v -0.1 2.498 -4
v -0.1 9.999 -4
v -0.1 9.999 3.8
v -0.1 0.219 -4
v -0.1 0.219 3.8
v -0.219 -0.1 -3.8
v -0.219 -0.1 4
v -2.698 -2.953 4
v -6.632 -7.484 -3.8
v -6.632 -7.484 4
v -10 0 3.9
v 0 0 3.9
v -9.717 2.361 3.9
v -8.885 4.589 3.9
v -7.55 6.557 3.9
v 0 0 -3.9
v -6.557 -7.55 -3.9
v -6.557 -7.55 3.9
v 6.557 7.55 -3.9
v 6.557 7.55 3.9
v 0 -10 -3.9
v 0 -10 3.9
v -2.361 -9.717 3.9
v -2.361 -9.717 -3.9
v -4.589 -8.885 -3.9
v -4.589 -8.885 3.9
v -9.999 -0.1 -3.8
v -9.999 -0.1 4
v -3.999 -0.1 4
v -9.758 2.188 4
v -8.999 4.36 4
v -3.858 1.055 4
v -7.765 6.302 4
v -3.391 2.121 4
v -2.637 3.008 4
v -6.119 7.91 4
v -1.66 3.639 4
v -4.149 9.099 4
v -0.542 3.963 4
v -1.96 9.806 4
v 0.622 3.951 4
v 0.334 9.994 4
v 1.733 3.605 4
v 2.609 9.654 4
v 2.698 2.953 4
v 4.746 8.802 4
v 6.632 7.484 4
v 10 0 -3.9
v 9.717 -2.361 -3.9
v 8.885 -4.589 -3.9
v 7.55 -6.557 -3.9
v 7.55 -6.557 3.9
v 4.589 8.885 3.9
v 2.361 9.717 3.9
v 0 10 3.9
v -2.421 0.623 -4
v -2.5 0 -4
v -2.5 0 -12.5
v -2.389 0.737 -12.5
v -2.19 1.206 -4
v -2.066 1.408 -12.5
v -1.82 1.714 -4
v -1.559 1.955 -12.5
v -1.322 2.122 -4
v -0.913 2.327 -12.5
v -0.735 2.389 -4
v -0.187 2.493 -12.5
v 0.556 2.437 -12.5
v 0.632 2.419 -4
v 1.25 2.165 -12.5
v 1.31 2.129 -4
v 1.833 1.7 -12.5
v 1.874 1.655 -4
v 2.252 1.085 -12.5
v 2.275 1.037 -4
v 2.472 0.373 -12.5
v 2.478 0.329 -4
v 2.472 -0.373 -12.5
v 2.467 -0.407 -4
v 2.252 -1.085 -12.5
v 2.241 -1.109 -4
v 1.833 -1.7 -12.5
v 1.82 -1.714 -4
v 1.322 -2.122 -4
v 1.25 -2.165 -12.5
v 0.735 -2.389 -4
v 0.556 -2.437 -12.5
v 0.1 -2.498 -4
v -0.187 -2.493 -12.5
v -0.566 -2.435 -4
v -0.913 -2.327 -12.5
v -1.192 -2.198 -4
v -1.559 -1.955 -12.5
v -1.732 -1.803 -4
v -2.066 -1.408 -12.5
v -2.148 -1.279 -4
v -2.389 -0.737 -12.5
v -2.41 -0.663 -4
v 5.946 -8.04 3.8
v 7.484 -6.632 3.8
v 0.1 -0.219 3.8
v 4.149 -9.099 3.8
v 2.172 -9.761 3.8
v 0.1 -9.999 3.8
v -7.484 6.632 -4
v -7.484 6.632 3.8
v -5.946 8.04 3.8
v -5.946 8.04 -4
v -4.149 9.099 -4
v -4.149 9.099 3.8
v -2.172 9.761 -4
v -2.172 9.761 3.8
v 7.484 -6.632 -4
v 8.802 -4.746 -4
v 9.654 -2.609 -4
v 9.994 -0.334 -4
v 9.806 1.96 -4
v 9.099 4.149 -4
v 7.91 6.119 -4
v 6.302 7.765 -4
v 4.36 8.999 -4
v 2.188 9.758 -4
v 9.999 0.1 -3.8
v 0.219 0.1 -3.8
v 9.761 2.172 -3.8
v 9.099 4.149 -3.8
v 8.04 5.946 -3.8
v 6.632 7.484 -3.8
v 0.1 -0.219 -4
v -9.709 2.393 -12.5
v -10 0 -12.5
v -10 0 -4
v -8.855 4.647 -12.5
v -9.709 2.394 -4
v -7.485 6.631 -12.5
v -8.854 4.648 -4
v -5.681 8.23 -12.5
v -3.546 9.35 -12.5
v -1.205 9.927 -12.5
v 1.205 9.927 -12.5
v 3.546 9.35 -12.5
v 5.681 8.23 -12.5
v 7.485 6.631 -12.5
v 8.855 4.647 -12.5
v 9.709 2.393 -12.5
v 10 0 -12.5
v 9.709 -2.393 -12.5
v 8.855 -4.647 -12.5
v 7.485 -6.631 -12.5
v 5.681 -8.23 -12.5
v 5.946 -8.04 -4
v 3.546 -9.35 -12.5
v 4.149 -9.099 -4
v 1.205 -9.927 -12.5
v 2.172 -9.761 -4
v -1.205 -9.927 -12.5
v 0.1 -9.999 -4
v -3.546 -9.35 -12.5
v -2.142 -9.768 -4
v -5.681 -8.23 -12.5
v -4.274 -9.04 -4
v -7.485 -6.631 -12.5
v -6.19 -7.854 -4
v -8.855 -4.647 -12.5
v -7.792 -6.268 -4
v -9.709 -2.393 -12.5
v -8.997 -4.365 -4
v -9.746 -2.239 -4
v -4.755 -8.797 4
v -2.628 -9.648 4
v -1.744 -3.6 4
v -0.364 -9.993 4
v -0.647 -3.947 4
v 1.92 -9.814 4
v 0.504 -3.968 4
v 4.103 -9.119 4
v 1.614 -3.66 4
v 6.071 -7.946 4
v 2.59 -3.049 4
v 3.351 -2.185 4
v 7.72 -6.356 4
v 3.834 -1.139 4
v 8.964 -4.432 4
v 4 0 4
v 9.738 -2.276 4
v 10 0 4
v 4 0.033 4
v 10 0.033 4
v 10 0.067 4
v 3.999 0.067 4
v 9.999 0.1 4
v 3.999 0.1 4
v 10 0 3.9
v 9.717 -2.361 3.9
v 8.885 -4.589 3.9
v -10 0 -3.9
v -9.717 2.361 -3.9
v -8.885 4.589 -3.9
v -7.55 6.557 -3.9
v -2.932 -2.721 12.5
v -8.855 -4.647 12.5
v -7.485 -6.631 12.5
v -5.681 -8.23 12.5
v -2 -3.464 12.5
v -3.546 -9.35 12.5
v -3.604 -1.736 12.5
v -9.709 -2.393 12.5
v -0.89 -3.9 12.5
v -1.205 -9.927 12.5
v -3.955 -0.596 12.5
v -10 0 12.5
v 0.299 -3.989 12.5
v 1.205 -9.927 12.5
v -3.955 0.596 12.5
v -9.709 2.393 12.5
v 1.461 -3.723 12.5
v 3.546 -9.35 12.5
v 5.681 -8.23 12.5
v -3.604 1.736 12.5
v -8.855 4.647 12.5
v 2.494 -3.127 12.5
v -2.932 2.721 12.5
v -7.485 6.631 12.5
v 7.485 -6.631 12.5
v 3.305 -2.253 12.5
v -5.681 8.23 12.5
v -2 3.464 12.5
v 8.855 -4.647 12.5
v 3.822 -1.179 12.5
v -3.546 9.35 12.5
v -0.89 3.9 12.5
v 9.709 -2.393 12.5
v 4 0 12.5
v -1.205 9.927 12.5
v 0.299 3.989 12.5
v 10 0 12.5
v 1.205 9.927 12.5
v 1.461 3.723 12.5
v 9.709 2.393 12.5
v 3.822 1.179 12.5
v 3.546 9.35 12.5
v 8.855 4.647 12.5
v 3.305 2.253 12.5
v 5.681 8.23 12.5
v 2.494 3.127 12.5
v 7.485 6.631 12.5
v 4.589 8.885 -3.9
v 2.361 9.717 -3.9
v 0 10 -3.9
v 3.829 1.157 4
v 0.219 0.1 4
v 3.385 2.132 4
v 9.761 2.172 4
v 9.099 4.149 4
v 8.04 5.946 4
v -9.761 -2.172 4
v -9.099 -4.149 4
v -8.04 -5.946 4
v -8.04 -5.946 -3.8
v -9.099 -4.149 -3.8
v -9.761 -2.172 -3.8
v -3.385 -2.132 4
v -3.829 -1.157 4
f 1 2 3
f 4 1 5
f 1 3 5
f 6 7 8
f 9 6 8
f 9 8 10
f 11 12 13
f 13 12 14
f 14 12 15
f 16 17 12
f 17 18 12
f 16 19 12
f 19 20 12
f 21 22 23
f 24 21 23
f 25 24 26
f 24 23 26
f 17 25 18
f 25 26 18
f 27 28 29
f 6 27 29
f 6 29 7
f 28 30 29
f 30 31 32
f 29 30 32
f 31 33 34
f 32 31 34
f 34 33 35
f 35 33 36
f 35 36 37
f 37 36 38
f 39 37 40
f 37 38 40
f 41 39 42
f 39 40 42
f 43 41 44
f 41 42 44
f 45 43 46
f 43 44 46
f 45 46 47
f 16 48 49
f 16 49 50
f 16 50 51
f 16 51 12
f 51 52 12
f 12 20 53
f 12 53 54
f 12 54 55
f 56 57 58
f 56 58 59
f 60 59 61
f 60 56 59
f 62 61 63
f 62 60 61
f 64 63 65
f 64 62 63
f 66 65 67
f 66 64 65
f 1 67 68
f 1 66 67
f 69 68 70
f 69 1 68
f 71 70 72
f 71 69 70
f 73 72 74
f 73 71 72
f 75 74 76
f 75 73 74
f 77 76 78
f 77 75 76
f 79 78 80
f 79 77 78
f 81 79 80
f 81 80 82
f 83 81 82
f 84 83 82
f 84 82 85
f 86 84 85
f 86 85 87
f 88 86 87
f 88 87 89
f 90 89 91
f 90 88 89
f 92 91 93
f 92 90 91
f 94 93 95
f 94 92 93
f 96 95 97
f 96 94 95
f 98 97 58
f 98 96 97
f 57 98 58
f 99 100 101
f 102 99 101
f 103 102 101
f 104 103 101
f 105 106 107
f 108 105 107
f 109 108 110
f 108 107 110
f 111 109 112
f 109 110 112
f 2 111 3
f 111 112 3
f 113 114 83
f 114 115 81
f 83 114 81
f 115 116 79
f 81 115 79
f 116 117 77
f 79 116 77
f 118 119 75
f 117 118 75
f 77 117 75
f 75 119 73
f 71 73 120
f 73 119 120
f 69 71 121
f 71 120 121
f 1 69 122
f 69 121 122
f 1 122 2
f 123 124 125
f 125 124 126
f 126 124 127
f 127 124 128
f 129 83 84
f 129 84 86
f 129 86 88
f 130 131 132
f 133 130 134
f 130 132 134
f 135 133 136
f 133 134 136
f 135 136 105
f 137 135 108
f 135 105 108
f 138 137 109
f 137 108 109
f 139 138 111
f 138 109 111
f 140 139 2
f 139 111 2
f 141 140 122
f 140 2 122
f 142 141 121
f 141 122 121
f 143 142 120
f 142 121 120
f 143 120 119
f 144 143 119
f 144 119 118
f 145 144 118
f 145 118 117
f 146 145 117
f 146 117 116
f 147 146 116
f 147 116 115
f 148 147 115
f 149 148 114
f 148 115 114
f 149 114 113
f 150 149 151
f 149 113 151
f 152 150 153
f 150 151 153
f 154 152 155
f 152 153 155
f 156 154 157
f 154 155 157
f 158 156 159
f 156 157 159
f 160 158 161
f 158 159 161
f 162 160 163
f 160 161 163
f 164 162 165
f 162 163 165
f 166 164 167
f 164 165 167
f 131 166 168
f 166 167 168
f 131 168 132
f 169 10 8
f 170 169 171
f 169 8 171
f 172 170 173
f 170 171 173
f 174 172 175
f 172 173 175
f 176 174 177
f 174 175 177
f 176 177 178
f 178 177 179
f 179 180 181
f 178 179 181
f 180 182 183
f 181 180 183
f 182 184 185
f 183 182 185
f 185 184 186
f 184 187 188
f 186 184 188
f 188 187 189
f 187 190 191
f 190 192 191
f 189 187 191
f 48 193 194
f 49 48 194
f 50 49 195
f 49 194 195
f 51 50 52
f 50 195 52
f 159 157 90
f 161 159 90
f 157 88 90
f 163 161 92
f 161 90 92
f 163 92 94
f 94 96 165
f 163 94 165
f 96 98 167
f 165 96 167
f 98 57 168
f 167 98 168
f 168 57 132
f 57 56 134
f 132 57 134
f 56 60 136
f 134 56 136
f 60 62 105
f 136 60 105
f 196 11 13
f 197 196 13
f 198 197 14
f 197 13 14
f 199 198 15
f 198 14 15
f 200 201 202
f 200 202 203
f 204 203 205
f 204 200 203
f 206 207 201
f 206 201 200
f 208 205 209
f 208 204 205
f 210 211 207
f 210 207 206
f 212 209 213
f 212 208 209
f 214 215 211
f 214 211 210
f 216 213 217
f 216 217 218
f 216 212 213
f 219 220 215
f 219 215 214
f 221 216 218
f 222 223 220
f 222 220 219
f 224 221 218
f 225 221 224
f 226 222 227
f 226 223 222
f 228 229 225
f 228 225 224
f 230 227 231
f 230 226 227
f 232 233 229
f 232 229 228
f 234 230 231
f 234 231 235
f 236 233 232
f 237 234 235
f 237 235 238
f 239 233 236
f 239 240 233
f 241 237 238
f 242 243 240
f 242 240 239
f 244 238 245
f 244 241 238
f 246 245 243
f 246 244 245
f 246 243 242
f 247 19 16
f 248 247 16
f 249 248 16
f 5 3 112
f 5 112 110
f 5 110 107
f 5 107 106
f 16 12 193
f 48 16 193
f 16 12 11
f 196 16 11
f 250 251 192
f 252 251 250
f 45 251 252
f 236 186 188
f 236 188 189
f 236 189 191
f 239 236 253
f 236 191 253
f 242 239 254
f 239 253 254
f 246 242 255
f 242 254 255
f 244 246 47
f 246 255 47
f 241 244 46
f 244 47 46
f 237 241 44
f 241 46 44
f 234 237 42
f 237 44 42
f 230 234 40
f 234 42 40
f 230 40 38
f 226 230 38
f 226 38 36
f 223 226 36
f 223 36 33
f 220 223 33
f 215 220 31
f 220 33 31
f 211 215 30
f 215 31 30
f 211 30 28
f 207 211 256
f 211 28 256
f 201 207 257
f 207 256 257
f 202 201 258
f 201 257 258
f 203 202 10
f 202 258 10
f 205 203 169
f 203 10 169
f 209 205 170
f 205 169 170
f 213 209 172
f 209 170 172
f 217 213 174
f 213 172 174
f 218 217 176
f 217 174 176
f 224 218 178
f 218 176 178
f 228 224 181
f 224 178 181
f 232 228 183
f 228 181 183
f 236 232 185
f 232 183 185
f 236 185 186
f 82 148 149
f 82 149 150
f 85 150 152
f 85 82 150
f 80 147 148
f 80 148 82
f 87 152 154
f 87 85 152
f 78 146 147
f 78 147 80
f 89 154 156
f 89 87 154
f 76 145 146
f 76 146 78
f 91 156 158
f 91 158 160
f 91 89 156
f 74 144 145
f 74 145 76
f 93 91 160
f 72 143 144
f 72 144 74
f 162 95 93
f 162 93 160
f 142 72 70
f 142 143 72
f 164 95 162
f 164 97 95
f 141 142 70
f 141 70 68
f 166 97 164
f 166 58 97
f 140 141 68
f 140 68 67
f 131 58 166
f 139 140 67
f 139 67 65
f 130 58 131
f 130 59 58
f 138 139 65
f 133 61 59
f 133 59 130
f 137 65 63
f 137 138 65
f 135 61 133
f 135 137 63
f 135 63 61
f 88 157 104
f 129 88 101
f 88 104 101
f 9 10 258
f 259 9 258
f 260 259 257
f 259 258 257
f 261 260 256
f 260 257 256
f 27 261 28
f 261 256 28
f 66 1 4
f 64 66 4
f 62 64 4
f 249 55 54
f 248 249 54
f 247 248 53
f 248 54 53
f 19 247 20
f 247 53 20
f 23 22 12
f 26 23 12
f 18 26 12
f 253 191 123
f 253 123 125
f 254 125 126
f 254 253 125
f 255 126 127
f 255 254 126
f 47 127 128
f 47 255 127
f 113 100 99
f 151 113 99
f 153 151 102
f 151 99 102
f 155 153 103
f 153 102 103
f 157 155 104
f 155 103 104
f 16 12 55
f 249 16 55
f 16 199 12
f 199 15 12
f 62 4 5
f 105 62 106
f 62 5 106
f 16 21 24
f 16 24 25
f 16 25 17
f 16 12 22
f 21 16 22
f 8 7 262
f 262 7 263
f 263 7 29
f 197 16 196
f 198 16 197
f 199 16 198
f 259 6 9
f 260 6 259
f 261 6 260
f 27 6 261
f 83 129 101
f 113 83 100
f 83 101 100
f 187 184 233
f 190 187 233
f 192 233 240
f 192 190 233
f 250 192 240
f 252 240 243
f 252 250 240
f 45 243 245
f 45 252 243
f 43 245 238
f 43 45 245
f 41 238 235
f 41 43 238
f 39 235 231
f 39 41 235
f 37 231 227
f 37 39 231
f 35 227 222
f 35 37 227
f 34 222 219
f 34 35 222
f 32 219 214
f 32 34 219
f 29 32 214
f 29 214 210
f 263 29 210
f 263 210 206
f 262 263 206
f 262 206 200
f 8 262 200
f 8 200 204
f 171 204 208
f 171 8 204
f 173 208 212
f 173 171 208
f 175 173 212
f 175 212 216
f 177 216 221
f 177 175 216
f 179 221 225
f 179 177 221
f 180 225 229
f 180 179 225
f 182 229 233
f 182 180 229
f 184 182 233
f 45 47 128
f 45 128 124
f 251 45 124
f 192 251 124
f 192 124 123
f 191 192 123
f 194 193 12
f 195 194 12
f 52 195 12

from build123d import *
from build123d.topology import SkipClean

# Parameters (mm, degrees)
BOSS_EXTRUDE1_DEPTH   = 3.9
BOSS_EXTRUDE1_2_DEPTH = 3.9
BOSS_EXTRUDE1_3_DEPTH = 3.9
BOSS_EXTRUDE1_4_DEPTH = 3.9
SKETCH2_R             = 10
SKETCH2_R_2           = 4
BOSS_EXTRUDE2_DEPTH   = 8.5
BOSS_EXTRUDE3_DEPTH   = 7.8
SKETCH4_R             = 10
SKETCH4_R_2           = 2.5
BOSS_EXTRUDE5_DEPTH   = 8.5
BOSS_EXTRUDE6_START   = 7.8
BOSS_EXTRUDE6_DEPTH   = 7.8


with BuildPart() as part:
    # Sketch1 → Boss-Extrude1 (new, symmetric)
    with BuildSketch(Plane.XY):
        with BuildLine():
            ThreePointArc((0, 10), (3.5, 9.367496998), (6.557247898, 7.55))
            Line((6.557247898, 7.55), (0, 0))
            Line((0, 0), (0, 10))
        make_face()
    extrude(amount=BOSS_EXTRUDE1_DEPTH, both=True)


with BuildPart() as body_2:
    # Sketch1 → Boss-Extrude1 2 (new, symmetric)
    with BuildSketch(Plane.XY):
        with BuildLine():
            ThreePointArc((10, 0), (9.367496998, -3.5), (7.55, -6.557247898))
            Line((7.55, -6.557247898), (0, 0))
            Line((0, 0), (10, 0))
        make_face()
    extrude(amount=BOSS_EXTRUDE1_2_DEPTH, both=True)


with BuildPart() as body_3:
    # Sketch1 → Boss-Extrude1 3 (new, symmetric)
    with BuildSketch(Plane.XY):
        with BuildLine():
            ThreePointArc((0, -10), (-3.5, -9.367496998), (-6.557247898, -7.55))
            Line((-6.557247898, -7.55), (0, 0))
            Line((0, 0), (0, -10))
        make_face()
    extrude(amount=BOSS_EXTRUDE1_3_DEPTH, both=True)


with BuildPart() as body_4:
    # Sketch1 → Boss-Extrude1 4 (new, symmetric)
    with BuildSketch(Plane.XY):
        with BuildLine():
            ThreePointArc((-10, 0), (-9.367496998, 3.5), (-7.55, 6.557247898))
            Line((-7.55, 6.557247898), (0, 0))
            Line((0, 0), (-10, 0))
        make_face()
    extrude(amount=BOSS_EXTRUDE1_4_DEPTH, both=True)


with BuildPart() as body_5:
    # Sketch2 → Boss-Extrude2 (new body)
    with BuildSketch(Plane.XY.offset(4)):
        Circle(SKETCH2_R)
        Circle(SKETCH2_R_2, mode=Mode.SUBTRACT)
    extrude(amount=BOSS_EXTRUDE2_DEPTH)

    # Sketch3 → Boss-Extrude3 (add)
    with SkipClean():  # the faces are left unmerged after this step: merging them gives an invalid solid
        with BuildSketch(Plane(origin=(0, 0, 4), x_dir=(-1, 0, 0), z_dir=(0, 0, -1))):
            with BuildLine():
                Line((-6.632420028, 7.484050012), (-0.219301297, 0.1))
                Line((-0.219301297, 0.1), (-9.999499987, 0.1))
                ThreePointArc((-9.999499987, 0.1), (-9.098694384, 4.148946916), (-6.632420028, 7.484050012))
            make_face()
            with BuildLine():
                Line((9.999499987, -0.1), (0.219301297, -0.1))
                Line((0.219301297, -0.1), (6.632420028, -7.484050012))
                ThreePointArc((6.632420028, -7.484050012), (9.098694384, -4.148946916), (9.999499987, -0.1))
            make_face()
        extrude(amount=BOSS_EXTRUDE3_DEPTH)


with BuildPart() as body_6:
    # Sketch4 → Boss-Extrude5 (new body)
    with BuildSketch(Plane(origin=(0, 0, -4), x_dir=(-1, 0, 0), z_dir=(0, 0, -1))):
        Circle(SKETCH4_R)
        Circle(SKETCH4_R_2, mode=Mode.SUBTRACT)
    extrude(amount=BOSS_EXTRUDE5_DEPTH)

    # Sketch5 → Boss-Extrude6 (add)
    with BuildSketch(Plane.XY.offset(-4).offset(BOSS_EXTRUDE6_START)):
        with BuildLine():
            Line((0.1, -0.219301297), (7.484050012, -6.632420028))
            ThreePointArc((7.484050012, -6.632420028), (4.148946916, -9.098694384), (0.1, -9.999499987))
            Line((0.1, -9.999499987), (0.1, -0.219301297))
        make_face()
        with BuildLine():
            Line((-0.1, 0.219301297), (-7.484050012, 6.632420028))
            ThreePointArc((-7.484050012, 6.632420028), (-4.148946916, 9.098694384), (-0.1, 9.999499987))
            Line((-0.1, 9.999499987), (-0.1, 0.219301297))
        make_face()
    extrude(amount=-BOSS_EXTRUDE6_DEPTH)


solid = Compound([part.part, body_2.part, body_3.part, body_4.part, body_5.part, body_6.part])
